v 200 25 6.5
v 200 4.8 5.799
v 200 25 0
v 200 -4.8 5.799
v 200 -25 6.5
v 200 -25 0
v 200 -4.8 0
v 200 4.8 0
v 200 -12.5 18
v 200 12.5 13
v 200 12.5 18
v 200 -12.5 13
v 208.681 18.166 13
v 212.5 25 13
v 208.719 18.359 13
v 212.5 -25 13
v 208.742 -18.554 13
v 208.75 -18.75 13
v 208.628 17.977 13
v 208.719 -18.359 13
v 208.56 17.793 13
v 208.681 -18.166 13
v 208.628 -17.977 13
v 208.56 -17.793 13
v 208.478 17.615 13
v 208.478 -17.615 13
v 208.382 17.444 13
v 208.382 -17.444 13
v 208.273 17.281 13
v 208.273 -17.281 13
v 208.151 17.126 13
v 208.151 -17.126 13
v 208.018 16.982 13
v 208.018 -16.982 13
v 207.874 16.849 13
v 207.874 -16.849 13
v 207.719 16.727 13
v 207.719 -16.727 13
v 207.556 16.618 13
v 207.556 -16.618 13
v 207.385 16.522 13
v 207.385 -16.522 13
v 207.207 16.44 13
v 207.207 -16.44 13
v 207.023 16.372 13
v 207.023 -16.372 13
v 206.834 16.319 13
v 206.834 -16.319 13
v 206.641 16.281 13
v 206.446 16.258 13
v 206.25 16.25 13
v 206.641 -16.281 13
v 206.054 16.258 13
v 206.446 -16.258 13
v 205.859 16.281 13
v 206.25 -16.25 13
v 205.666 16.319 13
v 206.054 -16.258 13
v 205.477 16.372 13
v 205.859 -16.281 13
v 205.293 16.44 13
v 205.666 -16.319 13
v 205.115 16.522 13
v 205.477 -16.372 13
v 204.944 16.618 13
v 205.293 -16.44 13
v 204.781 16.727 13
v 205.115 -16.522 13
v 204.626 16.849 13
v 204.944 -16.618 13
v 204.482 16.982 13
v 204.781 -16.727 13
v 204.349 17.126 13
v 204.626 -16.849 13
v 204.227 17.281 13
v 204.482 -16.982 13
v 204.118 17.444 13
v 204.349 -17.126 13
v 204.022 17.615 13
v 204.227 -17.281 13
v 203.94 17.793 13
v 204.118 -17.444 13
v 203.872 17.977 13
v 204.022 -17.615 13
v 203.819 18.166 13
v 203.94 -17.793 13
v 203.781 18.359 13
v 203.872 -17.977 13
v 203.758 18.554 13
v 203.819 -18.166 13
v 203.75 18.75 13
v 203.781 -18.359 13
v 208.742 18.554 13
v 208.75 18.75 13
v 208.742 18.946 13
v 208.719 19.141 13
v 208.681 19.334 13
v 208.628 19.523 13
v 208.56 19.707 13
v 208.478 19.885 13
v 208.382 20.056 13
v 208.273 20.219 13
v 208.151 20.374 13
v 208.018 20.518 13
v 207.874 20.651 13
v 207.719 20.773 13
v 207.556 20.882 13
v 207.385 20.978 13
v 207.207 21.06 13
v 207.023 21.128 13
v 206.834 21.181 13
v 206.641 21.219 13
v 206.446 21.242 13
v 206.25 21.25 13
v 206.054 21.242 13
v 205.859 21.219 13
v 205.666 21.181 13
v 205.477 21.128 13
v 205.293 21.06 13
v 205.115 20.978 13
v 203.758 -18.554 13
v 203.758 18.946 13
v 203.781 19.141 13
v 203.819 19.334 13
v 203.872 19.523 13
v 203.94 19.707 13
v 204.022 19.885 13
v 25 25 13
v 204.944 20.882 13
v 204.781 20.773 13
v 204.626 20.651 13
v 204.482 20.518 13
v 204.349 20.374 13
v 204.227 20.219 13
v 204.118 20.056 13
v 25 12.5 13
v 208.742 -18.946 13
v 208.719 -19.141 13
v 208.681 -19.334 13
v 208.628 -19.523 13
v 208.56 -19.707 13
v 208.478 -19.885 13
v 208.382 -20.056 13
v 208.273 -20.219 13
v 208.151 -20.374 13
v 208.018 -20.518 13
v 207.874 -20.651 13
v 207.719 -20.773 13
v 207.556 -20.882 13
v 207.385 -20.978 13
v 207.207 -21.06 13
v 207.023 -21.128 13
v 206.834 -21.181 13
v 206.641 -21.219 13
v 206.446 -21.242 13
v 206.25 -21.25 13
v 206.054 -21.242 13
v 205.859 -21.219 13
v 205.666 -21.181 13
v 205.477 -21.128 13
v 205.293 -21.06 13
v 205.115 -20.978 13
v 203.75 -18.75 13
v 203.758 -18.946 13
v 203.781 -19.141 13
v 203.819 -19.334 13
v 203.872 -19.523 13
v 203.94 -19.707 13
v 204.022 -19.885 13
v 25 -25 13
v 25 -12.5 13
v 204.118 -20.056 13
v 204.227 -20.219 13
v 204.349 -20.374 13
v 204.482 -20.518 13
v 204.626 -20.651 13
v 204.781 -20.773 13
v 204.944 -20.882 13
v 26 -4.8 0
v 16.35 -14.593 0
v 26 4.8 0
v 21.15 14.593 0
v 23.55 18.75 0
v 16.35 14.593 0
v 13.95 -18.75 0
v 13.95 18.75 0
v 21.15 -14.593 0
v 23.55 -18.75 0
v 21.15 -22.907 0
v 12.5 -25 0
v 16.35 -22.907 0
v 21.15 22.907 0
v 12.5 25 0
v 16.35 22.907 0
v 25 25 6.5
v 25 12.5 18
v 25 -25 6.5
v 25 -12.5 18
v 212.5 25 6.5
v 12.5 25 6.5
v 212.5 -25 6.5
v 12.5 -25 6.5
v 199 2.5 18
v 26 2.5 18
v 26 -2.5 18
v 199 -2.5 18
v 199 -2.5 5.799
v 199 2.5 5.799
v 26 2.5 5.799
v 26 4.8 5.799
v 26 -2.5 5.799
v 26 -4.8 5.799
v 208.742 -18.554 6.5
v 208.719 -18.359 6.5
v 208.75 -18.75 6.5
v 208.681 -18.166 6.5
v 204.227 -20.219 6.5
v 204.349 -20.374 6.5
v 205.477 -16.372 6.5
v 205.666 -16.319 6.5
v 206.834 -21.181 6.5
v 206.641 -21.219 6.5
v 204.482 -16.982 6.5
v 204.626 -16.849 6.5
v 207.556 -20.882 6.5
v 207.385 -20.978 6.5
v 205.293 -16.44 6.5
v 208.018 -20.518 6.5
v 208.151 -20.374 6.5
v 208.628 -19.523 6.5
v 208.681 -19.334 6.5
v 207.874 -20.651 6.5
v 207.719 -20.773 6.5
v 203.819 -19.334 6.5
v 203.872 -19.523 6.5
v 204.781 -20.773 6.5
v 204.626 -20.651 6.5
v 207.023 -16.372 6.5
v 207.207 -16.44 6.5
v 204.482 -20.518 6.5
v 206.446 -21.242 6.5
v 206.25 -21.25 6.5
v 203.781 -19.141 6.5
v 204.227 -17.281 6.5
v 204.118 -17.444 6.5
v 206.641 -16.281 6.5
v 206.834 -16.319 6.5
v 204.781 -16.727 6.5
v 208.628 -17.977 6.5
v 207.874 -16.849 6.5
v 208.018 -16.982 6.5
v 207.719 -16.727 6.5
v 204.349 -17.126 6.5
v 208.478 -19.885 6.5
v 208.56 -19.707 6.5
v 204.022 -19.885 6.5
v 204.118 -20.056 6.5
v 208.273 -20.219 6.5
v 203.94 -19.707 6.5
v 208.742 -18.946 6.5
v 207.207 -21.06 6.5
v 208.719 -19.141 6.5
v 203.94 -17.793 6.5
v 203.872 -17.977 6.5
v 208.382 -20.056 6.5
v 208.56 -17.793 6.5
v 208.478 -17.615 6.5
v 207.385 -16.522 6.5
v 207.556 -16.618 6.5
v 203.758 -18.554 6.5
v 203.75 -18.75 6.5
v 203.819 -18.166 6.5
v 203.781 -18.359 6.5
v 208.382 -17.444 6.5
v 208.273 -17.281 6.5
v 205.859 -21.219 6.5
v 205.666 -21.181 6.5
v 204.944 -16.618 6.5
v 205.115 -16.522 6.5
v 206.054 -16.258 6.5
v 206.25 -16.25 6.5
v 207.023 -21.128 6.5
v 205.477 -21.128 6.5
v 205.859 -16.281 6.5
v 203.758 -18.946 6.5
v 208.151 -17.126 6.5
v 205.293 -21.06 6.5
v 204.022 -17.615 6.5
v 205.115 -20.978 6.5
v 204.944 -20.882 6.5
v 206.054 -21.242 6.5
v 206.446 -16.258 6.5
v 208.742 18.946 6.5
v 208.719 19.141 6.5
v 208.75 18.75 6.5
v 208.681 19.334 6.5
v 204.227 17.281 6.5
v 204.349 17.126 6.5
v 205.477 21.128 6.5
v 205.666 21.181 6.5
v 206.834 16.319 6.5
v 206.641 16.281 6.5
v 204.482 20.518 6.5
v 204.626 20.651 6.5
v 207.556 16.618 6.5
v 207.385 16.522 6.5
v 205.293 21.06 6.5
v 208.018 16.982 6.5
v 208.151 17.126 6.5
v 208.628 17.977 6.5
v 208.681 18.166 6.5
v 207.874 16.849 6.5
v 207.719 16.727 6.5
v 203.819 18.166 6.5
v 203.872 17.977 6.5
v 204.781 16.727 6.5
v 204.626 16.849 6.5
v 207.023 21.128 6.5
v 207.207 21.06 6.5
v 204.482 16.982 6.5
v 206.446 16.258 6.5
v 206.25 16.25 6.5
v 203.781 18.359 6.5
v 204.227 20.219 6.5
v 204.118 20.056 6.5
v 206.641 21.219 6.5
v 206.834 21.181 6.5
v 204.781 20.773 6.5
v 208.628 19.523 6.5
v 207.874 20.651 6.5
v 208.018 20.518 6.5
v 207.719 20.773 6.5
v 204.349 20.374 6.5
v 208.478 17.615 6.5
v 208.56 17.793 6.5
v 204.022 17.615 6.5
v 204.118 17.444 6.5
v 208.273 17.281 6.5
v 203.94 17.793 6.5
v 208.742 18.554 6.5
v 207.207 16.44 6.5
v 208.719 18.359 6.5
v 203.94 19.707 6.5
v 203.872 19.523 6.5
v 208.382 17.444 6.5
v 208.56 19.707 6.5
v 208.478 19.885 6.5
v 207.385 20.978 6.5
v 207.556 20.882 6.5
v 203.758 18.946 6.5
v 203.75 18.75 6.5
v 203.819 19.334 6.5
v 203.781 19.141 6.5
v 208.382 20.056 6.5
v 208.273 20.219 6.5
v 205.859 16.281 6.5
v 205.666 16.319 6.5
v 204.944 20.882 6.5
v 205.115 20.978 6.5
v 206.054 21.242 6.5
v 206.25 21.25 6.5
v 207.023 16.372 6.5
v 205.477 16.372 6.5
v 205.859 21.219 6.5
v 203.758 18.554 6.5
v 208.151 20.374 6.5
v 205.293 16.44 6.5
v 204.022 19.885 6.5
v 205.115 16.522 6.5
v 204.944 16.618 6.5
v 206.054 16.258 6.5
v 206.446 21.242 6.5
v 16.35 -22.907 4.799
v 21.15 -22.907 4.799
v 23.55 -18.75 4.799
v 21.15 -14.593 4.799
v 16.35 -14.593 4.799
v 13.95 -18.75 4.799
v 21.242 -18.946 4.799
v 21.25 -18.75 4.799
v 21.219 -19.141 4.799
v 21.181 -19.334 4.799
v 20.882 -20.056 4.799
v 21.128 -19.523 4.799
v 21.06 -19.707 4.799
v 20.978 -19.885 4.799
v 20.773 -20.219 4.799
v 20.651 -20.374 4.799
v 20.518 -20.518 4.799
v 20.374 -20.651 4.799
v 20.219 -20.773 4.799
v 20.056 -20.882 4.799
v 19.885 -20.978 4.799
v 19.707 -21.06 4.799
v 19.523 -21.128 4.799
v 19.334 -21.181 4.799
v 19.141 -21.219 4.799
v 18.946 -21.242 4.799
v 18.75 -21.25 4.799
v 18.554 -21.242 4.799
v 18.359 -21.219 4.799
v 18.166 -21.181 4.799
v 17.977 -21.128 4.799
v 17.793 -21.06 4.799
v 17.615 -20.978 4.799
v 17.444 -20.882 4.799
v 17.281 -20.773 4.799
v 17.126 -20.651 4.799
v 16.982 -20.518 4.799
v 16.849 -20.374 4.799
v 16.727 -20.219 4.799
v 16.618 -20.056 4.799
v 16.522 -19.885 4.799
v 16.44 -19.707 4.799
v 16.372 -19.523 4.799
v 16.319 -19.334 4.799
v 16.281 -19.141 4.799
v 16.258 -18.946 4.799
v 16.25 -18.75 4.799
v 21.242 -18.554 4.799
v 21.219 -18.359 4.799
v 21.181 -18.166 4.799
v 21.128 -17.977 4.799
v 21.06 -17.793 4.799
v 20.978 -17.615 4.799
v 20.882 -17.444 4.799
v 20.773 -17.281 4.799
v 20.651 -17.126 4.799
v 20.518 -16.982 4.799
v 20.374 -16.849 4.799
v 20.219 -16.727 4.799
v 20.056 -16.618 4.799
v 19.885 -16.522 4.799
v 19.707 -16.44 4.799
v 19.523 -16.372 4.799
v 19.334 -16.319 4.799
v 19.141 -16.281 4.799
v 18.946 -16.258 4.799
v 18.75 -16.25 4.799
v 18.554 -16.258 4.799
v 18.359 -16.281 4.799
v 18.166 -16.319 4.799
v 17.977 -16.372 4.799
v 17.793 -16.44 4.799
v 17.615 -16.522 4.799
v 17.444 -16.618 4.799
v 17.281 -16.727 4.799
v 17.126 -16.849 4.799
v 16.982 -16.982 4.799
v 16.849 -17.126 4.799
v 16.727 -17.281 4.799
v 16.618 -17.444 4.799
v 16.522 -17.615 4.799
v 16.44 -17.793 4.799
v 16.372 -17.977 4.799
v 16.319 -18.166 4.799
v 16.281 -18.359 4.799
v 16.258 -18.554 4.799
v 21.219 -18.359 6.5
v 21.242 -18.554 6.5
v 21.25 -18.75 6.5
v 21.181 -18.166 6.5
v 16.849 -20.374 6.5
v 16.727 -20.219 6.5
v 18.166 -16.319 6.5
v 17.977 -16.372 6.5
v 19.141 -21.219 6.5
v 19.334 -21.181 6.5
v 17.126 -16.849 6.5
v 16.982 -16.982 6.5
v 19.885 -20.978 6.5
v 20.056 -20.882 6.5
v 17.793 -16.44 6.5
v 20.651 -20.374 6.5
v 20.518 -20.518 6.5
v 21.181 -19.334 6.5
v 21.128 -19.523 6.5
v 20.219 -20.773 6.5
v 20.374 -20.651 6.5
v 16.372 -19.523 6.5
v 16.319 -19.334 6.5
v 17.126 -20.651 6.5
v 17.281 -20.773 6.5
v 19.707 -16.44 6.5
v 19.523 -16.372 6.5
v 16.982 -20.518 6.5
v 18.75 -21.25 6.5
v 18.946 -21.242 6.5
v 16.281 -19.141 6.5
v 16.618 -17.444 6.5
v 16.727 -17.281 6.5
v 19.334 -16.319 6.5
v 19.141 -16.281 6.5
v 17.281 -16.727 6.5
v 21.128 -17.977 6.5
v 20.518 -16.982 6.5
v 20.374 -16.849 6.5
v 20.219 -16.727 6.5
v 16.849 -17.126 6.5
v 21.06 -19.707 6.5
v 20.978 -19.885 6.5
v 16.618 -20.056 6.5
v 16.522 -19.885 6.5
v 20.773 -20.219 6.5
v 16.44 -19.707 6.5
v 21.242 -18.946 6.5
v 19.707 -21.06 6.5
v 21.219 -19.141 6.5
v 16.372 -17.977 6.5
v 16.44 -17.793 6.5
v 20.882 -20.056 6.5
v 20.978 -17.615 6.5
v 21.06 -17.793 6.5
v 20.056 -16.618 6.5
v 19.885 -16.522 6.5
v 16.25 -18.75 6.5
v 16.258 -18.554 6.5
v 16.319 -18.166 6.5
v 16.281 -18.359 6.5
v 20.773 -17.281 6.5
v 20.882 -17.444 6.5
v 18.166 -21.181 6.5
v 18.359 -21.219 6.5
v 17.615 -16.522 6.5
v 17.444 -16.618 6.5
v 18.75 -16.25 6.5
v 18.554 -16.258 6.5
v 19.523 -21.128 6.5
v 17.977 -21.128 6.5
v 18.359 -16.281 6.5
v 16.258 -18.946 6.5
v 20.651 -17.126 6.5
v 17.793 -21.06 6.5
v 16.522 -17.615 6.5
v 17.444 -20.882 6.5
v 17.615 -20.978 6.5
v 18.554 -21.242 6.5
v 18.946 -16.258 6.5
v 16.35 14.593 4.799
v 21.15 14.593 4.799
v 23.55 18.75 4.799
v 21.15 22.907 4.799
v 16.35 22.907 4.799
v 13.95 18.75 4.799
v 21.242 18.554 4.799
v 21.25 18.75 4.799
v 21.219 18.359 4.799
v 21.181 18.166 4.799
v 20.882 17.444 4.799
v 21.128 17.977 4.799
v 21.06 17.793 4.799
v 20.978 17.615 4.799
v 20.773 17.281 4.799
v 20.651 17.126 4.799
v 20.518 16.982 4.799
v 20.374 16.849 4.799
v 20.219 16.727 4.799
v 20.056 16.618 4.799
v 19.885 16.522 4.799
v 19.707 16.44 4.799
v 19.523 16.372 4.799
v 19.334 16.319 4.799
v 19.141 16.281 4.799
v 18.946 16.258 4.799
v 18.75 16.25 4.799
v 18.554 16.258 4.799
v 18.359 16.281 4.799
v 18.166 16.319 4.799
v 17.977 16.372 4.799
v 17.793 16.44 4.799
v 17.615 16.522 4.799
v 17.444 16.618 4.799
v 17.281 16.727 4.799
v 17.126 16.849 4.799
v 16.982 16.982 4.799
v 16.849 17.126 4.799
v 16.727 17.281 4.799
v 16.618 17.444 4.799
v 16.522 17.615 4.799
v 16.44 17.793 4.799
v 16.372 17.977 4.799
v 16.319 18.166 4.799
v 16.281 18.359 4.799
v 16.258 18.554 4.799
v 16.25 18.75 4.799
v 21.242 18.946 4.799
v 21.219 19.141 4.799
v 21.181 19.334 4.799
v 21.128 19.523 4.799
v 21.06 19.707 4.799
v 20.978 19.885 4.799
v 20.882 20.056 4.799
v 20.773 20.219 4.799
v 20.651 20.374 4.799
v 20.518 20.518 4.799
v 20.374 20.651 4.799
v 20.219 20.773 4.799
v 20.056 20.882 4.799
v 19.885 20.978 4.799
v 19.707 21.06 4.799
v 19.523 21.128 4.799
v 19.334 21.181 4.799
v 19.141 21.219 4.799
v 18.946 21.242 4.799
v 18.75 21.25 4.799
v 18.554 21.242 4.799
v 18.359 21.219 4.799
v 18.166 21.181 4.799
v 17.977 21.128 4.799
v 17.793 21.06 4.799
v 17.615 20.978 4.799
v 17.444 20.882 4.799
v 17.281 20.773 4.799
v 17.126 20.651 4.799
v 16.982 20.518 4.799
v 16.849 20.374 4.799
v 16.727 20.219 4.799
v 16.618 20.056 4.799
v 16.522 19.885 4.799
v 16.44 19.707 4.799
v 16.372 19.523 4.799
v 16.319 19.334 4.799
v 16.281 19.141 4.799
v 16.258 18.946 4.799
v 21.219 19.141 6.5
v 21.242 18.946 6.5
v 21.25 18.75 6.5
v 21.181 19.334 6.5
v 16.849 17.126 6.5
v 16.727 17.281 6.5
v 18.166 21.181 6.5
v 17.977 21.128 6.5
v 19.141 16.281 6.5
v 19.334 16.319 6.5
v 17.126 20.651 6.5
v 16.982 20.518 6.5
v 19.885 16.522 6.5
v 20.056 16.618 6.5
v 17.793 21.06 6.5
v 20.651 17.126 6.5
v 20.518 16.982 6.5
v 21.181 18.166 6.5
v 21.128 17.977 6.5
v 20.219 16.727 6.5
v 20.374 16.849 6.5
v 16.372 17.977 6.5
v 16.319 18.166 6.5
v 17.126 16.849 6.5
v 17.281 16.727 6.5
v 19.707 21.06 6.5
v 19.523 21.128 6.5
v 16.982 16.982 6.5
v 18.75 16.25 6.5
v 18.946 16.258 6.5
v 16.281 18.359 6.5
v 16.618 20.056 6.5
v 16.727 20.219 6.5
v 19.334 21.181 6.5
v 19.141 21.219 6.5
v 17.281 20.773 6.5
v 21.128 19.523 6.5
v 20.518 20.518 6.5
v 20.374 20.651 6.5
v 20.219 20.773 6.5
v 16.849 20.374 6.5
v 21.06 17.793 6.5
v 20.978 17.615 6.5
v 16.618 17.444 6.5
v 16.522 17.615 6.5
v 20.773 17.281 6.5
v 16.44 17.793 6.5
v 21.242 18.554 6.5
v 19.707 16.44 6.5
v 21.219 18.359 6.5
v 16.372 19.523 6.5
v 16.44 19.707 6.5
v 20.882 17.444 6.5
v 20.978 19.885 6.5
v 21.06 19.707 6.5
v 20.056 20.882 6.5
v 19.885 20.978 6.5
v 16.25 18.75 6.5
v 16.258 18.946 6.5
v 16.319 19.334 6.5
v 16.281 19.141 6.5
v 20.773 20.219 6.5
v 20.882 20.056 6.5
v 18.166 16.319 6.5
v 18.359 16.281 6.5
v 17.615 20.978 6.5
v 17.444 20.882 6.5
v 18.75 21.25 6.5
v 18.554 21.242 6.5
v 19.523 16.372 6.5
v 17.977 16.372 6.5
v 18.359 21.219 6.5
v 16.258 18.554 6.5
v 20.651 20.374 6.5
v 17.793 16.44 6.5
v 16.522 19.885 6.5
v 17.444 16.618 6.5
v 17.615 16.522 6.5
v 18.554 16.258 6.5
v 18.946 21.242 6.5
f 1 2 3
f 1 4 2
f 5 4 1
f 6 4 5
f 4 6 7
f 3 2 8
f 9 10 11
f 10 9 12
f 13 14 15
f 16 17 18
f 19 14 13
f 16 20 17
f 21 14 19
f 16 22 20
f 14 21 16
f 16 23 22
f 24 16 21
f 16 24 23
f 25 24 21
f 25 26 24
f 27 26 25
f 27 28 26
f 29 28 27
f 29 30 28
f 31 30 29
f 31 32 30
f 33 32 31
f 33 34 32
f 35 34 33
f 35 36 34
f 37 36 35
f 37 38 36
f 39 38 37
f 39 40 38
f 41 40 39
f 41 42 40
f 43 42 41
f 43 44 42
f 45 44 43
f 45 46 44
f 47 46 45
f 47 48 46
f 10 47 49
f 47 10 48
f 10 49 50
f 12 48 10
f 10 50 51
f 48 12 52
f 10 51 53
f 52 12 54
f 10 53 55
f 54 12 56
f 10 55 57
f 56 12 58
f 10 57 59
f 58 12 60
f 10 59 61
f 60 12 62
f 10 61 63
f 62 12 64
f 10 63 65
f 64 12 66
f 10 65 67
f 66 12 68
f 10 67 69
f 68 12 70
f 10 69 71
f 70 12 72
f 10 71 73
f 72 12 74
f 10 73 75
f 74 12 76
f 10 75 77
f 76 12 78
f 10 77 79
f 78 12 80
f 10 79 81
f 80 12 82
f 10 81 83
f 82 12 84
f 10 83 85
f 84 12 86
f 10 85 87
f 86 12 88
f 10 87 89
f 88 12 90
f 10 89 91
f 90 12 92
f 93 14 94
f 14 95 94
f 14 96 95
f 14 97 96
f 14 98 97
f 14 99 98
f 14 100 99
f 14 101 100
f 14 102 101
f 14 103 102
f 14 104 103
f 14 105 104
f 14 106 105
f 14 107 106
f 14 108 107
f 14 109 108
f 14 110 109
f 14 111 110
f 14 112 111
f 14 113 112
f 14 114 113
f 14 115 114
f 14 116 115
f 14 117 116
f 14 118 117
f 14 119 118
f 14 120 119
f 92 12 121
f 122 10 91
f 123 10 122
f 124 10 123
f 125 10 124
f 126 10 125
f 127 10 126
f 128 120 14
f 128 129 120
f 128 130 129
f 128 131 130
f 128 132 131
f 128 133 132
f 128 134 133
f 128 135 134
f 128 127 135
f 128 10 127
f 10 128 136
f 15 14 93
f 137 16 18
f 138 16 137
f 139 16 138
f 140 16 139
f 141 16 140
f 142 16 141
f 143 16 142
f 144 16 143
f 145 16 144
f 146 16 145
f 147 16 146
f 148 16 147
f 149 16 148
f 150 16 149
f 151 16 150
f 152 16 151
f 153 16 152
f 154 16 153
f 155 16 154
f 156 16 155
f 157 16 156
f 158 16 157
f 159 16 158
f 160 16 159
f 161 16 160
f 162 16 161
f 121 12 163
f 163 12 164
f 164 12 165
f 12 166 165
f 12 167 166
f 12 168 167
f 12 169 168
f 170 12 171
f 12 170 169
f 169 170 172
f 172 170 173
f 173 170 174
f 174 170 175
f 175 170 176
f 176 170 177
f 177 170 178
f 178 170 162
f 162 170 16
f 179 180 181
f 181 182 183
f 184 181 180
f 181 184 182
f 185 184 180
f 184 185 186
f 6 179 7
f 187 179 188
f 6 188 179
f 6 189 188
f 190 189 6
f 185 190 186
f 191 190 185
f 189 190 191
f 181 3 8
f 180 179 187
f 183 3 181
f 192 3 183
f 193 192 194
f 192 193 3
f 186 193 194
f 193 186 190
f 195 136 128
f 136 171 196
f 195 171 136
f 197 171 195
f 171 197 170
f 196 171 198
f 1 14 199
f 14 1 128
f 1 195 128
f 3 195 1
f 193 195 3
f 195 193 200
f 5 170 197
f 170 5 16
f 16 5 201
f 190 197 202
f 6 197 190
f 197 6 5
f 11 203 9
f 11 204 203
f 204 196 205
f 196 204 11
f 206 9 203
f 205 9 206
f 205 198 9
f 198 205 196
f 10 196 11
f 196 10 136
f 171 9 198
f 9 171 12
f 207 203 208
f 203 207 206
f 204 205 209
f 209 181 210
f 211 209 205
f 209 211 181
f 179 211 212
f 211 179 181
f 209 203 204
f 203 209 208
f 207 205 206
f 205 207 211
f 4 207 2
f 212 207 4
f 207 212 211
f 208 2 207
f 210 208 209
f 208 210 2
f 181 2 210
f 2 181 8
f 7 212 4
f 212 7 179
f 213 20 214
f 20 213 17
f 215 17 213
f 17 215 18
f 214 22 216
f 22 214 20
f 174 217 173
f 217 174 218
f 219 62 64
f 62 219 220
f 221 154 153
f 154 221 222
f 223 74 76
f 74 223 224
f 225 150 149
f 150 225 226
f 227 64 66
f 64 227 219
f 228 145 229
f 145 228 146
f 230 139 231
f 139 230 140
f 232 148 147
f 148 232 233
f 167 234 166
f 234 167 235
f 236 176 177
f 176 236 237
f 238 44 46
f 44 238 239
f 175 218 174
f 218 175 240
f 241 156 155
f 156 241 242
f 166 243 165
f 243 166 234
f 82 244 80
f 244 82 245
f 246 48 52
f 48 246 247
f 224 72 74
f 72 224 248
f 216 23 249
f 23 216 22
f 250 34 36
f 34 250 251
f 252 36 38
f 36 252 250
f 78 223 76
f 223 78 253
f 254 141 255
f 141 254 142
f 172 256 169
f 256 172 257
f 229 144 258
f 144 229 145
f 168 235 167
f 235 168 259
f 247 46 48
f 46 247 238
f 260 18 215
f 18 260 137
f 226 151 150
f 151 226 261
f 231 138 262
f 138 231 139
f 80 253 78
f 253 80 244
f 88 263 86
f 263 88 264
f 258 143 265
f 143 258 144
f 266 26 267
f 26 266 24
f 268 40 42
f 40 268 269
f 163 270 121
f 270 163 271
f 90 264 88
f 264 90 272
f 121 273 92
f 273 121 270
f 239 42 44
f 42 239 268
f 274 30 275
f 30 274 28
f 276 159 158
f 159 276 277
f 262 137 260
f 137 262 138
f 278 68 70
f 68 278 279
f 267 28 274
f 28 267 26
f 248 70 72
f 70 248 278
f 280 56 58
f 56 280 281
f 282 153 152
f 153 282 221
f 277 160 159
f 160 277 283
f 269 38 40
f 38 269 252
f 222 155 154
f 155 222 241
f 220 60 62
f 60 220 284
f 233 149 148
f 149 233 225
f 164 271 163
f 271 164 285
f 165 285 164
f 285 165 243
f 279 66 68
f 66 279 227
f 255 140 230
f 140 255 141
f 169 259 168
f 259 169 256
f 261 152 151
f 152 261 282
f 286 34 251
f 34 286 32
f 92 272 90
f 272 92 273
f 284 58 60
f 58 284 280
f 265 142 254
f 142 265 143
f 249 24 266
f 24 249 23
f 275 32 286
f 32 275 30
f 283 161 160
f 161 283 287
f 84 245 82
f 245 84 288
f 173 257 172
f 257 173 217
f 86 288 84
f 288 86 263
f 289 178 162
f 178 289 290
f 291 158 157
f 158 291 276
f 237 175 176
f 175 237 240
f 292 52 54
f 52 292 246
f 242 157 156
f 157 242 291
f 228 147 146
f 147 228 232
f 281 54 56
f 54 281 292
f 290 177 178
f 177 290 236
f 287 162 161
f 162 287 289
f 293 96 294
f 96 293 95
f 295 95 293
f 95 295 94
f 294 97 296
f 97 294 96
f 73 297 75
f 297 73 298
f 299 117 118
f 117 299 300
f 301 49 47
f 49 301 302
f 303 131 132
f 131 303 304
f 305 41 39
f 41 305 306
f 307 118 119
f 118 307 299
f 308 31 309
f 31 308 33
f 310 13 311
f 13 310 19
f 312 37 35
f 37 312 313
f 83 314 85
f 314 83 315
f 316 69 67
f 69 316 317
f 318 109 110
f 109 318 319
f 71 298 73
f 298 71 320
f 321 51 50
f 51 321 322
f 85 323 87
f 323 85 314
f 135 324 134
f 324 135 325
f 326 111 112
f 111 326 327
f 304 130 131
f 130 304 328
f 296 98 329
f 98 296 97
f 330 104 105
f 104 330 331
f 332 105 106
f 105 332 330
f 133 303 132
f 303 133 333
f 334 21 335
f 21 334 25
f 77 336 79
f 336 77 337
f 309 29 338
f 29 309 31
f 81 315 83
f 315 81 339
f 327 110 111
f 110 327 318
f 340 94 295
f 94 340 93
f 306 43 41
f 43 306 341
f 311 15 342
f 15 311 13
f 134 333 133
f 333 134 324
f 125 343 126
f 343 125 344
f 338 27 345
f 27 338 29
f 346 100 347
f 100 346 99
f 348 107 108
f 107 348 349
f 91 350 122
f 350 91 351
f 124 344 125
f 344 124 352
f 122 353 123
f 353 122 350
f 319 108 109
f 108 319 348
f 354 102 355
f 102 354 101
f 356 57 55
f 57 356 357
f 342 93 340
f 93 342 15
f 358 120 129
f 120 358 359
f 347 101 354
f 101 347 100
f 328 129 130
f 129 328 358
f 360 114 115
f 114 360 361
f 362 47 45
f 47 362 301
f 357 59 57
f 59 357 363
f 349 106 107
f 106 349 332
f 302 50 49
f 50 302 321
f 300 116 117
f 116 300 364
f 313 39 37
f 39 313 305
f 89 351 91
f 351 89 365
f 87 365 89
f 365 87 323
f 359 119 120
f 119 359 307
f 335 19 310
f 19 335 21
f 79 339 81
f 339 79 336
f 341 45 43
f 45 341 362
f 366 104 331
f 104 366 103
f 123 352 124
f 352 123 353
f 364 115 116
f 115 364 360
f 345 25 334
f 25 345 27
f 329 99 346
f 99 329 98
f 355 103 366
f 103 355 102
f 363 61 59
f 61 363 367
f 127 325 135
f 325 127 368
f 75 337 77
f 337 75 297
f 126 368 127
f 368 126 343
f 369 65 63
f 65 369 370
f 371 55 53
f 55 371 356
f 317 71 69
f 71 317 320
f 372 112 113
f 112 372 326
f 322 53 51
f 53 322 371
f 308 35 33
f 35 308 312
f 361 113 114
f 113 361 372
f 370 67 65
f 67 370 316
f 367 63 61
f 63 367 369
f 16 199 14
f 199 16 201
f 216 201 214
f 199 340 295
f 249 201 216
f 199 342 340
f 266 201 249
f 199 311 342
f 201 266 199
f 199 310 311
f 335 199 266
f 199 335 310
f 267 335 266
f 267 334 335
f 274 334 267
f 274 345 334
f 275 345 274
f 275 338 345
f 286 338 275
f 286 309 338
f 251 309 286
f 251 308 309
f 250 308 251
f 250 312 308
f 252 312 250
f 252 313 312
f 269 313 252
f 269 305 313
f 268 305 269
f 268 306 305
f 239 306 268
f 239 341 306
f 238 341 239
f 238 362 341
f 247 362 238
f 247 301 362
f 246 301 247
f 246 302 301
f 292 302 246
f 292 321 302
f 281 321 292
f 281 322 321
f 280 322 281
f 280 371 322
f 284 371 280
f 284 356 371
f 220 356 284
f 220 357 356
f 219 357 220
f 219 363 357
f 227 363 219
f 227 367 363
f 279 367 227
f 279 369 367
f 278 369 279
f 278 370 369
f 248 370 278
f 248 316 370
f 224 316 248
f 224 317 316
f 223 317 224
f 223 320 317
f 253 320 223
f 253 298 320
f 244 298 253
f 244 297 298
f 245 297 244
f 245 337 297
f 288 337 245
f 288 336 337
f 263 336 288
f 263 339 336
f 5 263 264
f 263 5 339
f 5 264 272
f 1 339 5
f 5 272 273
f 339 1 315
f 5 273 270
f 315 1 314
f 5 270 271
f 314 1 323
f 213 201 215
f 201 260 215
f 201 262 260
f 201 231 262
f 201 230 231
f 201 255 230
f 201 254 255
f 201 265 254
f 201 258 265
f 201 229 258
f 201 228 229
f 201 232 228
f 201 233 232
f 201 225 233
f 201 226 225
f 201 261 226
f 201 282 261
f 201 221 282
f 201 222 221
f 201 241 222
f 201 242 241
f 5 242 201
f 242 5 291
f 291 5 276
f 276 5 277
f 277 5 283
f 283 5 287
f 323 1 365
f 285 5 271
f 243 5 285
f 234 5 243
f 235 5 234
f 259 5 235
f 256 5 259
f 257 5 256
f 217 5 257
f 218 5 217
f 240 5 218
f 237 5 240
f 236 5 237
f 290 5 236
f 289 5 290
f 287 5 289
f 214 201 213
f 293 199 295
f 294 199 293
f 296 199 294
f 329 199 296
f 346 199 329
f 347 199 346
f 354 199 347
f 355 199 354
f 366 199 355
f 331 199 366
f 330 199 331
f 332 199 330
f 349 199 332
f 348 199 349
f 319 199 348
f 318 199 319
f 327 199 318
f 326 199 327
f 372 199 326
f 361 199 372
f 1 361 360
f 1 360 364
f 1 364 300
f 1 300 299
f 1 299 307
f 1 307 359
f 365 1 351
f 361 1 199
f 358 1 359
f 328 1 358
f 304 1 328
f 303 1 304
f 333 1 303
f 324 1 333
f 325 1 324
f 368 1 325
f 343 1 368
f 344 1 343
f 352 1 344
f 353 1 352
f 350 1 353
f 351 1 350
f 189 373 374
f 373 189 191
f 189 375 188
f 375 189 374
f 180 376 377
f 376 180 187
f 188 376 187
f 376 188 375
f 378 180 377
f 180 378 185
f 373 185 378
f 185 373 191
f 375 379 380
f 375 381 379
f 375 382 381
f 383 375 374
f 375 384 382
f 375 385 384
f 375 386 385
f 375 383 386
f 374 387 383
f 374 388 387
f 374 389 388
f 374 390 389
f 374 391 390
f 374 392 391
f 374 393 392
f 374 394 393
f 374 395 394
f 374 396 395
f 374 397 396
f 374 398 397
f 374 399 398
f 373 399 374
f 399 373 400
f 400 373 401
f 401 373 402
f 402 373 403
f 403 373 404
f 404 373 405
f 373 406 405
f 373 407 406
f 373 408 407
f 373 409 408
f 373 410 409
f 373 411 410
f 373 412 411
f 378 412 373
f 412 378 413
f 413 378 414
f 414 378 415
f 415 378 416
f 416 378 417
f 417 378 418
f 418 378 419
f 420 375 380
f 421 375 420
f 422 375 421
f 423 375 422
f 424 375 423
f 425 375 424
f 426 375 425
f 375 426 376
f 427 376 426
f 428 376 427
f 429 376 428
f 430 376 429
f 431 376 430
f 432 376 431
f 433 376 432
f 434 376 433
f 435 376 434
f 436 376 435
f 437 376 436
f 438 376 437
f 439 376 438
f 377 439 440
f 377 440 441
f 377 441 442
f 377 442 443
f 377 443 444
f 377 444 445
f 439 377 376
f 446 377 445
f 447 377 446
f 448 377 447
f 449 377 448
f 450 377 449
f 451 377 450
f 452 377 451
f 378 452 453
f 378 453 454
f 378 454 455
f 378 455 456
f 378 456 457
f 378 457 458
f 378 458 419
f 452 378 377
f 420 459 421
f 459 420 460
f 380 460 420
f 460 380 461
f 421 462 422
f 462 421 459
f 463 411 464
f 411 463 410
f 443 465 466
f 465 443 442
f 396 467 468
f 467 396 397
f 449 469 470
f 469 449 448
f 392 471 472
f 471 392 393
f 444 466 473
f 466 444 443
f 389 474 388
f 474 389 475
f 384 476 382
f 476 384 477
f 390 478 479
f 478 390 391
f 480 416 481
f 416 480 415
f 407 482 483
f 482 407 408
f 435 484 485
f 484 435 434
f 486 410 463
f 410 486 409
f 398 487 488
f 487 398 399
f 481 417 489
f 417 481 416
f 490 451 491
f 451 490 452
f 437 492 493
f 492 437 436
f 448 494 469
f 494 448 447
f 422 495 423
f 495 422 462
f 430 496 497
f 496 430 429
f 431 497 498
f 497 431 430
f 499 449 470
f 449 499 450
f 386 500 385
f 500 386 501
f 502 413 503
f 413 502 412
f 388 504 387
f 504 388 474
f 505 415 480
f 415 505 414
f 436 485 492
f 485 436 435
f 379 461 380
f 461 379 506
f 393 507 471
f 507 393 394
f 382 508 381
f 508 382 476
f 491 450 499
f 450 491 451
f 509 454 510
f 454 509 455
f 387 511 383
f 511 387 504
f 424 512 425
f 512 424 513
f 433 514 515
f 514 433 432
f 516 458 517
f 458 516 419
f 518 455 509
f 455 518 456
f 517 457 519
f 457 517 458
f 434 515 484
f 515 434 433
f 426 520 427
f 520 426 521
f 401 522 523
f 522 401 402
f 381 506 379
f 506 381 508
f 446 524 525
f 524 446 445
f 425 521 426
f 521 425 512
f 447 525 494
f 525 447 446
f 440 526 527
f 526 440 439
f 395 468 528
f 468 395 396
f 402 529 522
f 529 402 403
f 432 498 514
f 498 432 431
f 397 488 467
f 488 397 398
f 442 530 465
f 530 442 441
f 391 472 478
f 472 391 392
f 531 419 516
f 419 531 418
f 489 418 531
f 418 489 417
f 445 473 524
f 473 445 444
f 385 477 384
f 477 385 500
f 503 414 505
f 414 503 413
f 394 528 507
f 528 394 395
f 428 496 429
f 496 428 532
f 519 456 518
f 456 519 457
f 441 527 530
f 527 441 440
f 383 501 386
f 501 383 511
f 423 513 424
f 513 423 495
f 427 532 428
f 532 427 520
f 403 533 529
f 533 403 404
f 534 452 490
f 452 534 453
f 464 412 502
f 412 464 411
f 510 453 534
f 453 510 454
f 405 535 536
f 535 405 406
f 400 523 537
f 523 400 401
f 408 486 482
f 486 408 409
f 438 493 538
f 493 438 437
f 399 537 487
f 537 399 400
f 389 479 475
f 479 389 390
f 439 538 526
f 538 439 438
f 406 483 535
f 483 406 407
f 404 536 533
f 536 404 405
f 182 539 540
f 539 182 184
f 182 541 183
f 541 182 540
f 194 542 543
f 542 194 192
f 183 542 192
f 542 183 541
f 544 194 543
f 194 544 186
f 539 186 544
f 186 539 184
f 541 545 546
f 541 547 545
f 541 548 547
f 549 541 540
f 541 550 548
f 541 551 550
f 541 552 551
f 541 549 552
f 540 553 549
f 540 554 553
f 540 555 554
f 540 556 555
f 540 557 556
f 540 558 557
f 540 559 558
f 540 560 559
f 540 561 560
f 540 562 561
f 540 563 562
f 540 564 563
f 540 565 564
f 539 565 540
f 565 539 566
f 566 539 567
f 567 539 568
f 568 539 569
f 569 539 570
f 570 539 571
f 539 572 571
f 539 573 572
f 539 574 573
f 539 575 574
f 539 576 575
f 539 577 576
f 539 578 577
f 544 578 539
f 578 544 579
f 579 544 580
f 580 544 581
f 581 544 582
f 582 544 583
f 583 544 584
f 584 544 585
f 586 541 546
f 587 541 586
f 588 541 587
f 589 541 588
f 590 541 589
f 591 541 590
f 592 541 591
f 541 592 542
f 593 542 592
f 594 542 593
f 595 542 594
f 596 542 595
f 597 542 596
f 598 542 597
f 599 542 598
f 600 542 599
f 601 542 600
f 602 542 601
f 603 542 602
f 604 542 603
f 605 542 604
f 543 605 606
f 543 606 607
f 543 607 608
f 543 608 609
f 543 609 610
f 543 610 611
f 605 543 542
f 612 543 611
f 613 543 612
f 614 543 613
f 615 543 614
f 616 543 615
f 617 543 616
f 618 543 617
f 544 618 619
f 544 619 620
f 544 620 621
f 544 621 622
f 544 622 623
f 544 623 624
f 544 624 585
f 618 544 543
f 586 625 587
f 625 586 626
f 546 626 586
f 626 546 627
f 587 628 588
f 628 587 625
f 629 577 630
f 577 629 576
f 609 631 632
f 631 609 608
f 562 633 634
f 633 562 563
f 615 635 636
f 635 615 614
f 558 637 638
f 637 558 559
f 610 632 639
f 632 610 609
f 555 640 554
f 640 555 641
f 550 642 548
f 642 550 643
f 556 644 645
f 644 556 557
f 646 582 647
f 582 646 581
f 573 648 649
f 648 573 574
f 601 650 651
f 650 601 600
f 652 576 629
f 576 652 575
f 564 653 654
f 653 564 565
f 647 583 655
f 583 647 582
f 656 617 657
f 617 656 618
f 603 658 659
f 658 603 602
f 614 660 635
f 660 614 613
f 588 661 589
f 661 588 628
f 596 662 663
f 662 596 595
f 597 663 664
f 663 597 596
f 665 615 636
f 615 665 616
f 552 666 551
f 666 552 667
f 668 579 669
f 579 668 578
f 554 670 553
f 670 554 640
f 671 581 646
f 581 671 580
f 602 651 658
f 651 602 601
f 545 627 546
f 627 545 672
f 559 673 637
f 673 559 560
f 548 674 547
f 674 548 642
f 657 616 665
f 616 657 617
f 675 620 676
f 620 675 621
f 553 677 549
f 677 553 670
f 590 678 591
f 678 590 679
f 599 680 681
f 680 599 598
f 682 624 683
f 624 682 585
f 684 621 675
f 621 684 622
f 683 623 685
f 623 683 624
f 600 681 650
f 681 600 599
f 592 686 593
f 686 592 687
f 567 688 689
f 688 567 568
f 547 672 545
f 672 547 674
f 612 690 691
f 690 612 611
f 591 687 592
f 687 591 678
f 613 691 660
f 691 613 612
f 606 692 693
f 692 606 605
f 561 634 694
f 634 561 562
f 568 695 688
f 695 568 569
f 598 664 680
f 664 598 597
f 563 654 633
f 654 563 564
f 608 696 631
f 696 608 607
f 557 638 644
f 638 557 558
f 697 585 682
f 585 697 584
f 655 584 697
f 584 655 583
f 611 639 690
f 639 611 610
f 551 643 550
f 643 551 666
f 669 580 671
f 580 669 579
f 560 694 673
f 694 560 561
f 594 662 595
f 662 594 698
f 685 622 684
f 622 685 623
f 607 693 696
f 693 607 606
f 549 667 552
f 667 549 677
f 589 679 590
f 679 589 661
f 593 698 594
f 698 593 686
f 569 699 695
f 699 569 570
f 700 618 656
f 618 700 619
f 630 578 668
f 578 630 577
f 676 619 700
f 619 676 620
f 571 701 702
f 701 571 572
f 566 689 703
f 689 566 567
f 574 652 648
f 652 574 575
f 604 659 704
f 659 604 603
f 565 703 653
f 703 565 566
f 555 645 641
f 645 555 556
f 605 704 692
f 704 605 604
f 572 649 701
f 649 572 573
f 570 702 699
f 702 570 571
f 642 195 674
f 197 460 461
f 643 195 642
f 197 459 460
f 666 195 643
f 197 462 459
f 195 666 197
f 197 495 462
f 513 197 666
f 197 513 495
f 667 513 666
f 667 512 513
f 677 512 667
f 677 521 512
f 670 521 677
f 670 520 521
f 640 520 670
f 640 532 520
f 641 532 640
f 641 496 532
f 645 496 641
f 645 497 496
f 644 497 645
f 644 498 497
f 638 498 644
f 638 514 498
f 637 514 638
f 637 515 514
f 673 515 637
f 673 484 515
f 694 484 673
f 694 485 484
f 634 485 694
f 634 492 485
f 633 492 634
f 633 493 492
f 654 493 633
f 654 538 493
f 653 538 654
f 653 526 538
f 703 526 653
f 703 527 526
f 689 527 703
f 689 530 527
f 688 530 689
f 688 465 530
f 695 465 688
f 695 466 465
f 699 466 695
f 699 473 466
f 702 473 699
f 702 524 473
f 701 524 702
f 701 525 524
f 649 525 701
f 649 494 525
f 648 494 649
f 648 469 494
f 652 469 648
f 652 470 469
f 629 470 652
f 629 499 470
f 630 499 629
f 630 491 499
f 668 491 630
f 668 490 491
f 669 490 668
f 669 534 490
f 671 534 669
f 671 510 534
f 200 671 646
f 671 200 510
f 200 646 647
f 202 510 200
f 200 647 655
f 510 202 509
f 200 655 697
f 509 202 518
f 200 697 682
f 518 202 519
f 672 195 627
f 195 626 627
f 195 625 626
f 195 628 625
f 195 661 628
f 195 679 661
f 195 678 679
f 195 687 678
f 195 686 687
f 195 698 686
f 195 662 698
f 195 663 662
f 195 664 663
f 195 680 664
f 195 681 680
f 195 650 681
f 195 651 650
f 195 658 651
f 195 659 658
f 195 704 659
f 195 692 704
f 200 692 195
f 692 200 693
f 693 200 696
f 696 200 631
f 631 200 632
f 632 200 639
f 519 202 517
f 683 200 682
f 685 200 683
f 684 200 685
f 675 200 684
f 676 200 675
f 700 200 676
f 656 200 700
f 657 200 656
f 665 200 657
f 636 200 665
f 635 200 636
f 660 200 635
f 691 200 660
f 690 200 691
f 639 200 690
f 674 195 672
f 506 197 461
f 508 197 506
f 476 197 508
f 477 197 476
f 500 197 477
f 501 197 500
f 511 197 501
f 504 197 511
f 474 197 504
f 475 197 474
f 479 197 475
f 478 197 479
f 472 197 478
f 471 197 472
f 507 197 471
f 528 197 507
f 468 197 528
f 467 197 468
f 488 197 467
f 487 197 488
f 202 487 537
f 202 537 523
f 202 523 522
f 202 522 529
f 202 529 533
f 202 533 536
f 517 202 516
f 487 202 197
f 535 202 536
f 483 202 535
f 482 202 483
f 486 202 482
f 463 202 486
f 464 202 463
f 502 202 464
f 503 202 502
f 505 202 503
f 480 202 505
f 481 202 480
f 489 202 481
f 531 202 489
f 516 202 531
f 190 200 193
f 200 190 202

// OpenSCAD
// file: Modules.scad
/*
 * Jig to hold a model airplane while working on it.
 *
 * Vertical sections slide horizonally. Horizontal dimensions are scalable
 * by adding one or more extension bars.
 *
 * Wing supports clamp magnetically. Be sure to glue some felt on the
 * insides of the wing supports to protect the model
 *
 * ©Louis Kowolowski 2020
 */

module tail_holder () {
	translate ([3*bar_w, 0, 10]) {
		rotate ([0, 180, 0]) {
			tail_holder_bottom ();
		}
	}
	// height is +5 (thickness of top) because its been flipped over
	translate ([0, 0, -7]) {
		tail_holder_top ();
	}
}

module tail_holder_bottom () {
	difference () {
		cube ([3*bar_w, 1.5*bar_screw_head_d, bar_w/4]);

		union () {
			// screw/nut hole
			translate ([1.5*bar_w, 1.5*bar_screw_head_d+0.001, bar_w/8]) {
				rotate ([90, 0, 0]) {
					bar_screw ();
				}
			}
			// left magnet hole
			translate ([0.75*bar_screw_head_d, 1.5*bar_screw_d, bar_w/4-magnet_h+0.001]) {
				cylinder (magnet_h, d=magnet_d, $fn=80);
			}
			// right magnet hole
			translate ([(3*bar_w)-(0.75*bar_screw_head_d), 1.5*bar_screw_d, bar_w/4-magnet_h+0.001]) {
				cylinder (magnet_h, d=magnet_d, $fn=80);
			}
		}
	}
	// left side
	translate ([0, 1.5*bar_screw_head_d, 0]) {
		cube ([bar_w, bar_w, 5]);
	}

	// right side
	translate ([2*bar_w, 1.5*bar_screw_head_d, 0]) {
		cube ([bar_w, bar_w, 5]);
	}

}

module tail_holder_top () {

	difference () {
		cube ([3*bar_w, 1.5*bar_screw_head_d, 5]);
		union () {
			// left magnet hole
			translate ([0.75*bar_screw_head_d, 1.5*bar_screw_d, 5.001-magnet_h]) {
				cylinder (magnet_h, d=magnet_d, $fn=80);
			}
			// right magnet hole
			translate ([(3*bar_w)-(0.75*bar_screw_head_d), 1.5*bar_screw_d, 5.001-magnet_h]) {
				cylinder (magnet_h, d=magnet_d, $fn=80);
			}
		}
	}
	// left side
	translate ([0, 1.5*bar_screw_head_d, 0]) {
		cube ([bar_w, bar_w, 5]);
	}

	// right side
	translate ([2*bar_w, 1.5*bar_screw_head_d, 0]) {
		cube ([bar_w, bar_w, 5]);
	}
}

module nose_holder () {
	difference () {
		union () {
			cube ([bar_w, bar_w, 6]);
			translate ([0, 0, 6]) {
				// rear block to house screw/nut holder and magnets for top
				cube ([bar_screw_head_d, bar_w, 1.5*bar_screw_head_d]);
			}
			translate ([0, 0, 6]) {
				// rear block to house screw/nut holder and magnets for top
				cube ([bar_w, bar_w, 1.5*bar_screw_head_d]);
			}
		}
		union () {
			// screw/nut hole
			translate ([bar_screw_head_d+1, bar_w/2, 10]) {
				rotate ([0, 270, 0]) {
					bar_screw ();
				}
			}
			// angled cut to hold nose centered in jib
			translate ([bar_w/2+.5*bar_screw_head_d+0.001, bar_w/2, bar_w/2-5]) {
				rotate ([270, 210, 90]) {
					Triangle(a=bar_w, b=bar_w, angle=120, height=bar_w-bar_screw_head_d+0.001, centerXYZ=[true,true,true]);
				}
			}
			
		}
	}
}


module wing_holder () {
	wing_holder_bottom ();

	translate ([0, 0, 1.5*bar_screw_head_d+2]) {
		wing_holder_top ();
	}
}

module wing_holder_bottom () {
	// slides up and down the riser to hold the wing at the correct height
	difference () {
		union () {
			cube ([bar_w, bar_w, 6]);
			translate ([0, 0, 6]) {
				// rear block to house screw/nut holder and magnets for top
				// add 1 to height for room above the nut
				cube ([bar_screw_head_d, bar_w, bar_screw_head_d+1]);
			}
		}
		union () {
			// screw/nut hole
			translate ([bar_screw_head_d+1, bar_w/2, 11]) {
				rotate ([0, 270, 0]) {
					bar_screw ();
				}
			}
			// magnet mounting holes
			translate ([magnet_d/2+2, magnet_d, bar_screw_head_d+4.001]) {
				rotate ([0, 0, 90]) {
					cylinder (magnet_h, d=magnet_d, $fn=80);
				}
			}
			// magnet mounting holes
			translate ([magnet_d/2+2, bar_w-magnet_d, bar_screw_head_d+4.001]) {
				rotate ([0, 0, 90]) {
					cylinder (magnet_h, d=magnet_d, $fn=80);
				}
			}
		}
	}
}

module wing_holder_top () {
	difference () {
		cube ([bar_w, bar_w, 6]);
		union () {
			// magnet mounting holes
			translate ([bar_w-magnet_d, magnet_d, -1*0.001]) {
				rotate ([0, 0, 90]) {
					cylinder (magnet_h, d=magnet_d, $fn=80);
				}
			}
			// magnet mounting holes
			translate ([bar_w-magnet_d, bar_w-magnet_d, -1*0.001]) {
				rotate ([0, 0, 90]) {
					cylinder (magnet_h, d=magnet_d, $fn=80);
				}
			}
		}
	}
}

module riser () {
	/* vertical bar that will slide forward/backward on the base and hold the
	 * horizontal rest(s) for the model
	 */
	difference () {
		// base
		cube ([riser_w, riser_w, riser_w/4]);	
		union () {
			// slot at bottom for guide on bar
			translate ([riser_w/4, -1*0.001, -1*0.01]) {
				cube ([riser_w/2, riser_w+1, 5.01]);
			}
			// cross slot at bottom for guide on bar
			translate ([-0.001, riser_w/4, -1*0.01]) {
				cube ([riser_w+1, riser_w/2, 5.01]);
			}
			// screw hole
			translate ([riser_w/2, riser_w/2, -1*bar_screw_head_h]) {
				bar_screw ();
			}
		}
	}
	difference () {
		// vartical riser
		translate ([0, 0, riser_w/4]) {
			cube ([riser_w, riser_w/8, riser_l]);
		}
		// screw slot
		translate ([riser_w/2-bar_screw_d/2, -1, riser_w]) {
			cube ([bar_screw_d, riser_w/4+1, riser_l-riser_w]);
		}
	}
}

module bar_screw () {
	// Model of a screw and hex head/nut

	// screw head
	cylinder(bar_screw_head_h, d=bar_screw_head_d, $fn=6);
	translate ([0, 0, 0]) {
		// screw body
		cylinder(bar_screw_h, d=bar_screw_d, $fn=80);
	}
}

module bar () {
	/* lower base unit. Comes together as a cross. Each bar can be extended with
	 * additional bars.
	 * Raised section acts as a guide for the riser. Slot down the middle is for
	 * a clamping butterfly screw.
	 */
	difference () {
		union () {
			cube ([bar_l, bar_w, bar_h]);
			translate ([0, bar_w/4, 0]) {
				// guide slot
				cube ([bar_l, bar_w/2, bar_h+5]);
			}
		}
		translate ([1, bar_w/2-bar_screw_d/2, -0.001]) {
			cube ([bar_l-2, bar_screw_d, bar_screw_h]);
		}
		translate ([1, bar_w/2-bar_screw_head_d/2, -0.001]) {
			 cube ([bar_l, bar_screw_head_d, bar_screw_head_h+1]);
		}
	}
	// upper extension
	difference () {
		translate ([bar_l, 0, bar_h/2]) {
			cube ([bar_w/4, bar_w, bar_h/2]);
		}
		union () {
			// 2 screw holes
			// left
			translate ([bar_l+bar_w/8, bar_w/8, -1*0.001]) {
				bar_screw ();
			}
			// right
			translate ([bar_l+bar_w/8, bar_w-bar_w/8, -1*0.001]) {
				bar_screw ();
			}
		}
	}
	// lower extension
	difference () {
		translate ([-1*bar_w/4, 0, 0]) {
			cube ([bar_w/4, bar_w, bar_h/2]);
		}
		union () {
			// 2 screw holes
			// left
			translate ([-1*bar_w/4+bar_w/8, bar_w/8, -1*0.001]) {
				bar_screw ();
			}
			// right
			translate ([-1*bar_w/4+bar_w/8, bar_w-bar_w/8, -1*0.001]) {
				bar_screw ();
			}
		}
	}

}

module Triangle(
			a, b, angle, height=1, heights=undef,
			center=undef, centerXYZ=[false,false,false]) {
	// Calculate Heights at each point
	heightAB = ((heights==undef) ? height : heights[0])/2;
	heightBC = ((heights==undef) ? height : heights[1])/2;
	heightCA = ((heights==undef) ? height : heights[2])/2;
	centerZ = (center || (center==undef && centerXYZ[2]))?0:max(heightAB,heightBC,heightCA);

	// Calculate Offsets for centering
	offsetX = (center || (center==undef && centerXYZ[0]))?((cos(angle)*a)+b)/3:0;
	offsetY = (center || (center==undef && centerXYZ[1]))?(sin(angle)*a)/3:0;
	
	pointAB1 = [-offsetX,-offsetY, centerZ-heightAB];
	pointAB2 = [-offsetX,-offsetY, centerZ+heightAB];
	pointBC1 = [b-offsetX,-offsetY, centerZ-heightBC];
	pointBC2 = [b-offsetX,-offsetY, centerZ+heightBC];
	pointCA1 = [(cos(angle)*a)-offsetX,(sin(angle)*a)-offsetY, centerZ-heightCA];
	pointCA2 = [(cos(angle)*a)-offsetX,(sin(angle)*a)-offsetY, centerZ+heightCA];

	polyhedron(
		points=[	pointAB1, pointBC1, pointCA1,
					pointAB2, pointBC2, pointCA2 ],
		faces=[	
			[0, 1, 2],
			[3, 5, 4],
			[0, 3, 1],
			[1, 3, 4],
			[1, 4, 2],
			[2, 4, 5],
			[2, 5, 0],
			[0, 5, 3] ] );
}
// file: Globals.scad
/*
 * Global variables used for all the models
 * All units are in mm
 *
 * Jig to hold a model airplane while working on it.
 *
 * Vertical sections slide horizonally. Horizontal dimensions are scalable
 * by adding one or more extension bars.
 *
 * Wing supports clamp magnetically. Be sure to glue some felt on the
 * insides of the wing supports to protect the model
 *
 * ©Louis Kowolowski 2020
 */

/* long dimensions are constrained by the size of the print bed
 */
bar_l = 175;
bar_w = 50;
bar_h = 13;

riser_l = 150;
riser_w = 50;
riser_h = 12;

// M5x20
bar_screw_head_h = 4.8;
bar_screw_head_d = 9.6;
bar_screw_h = 20;
bar_screw_d = 5;

guide_rail_l = bar_l;
guide_rail_w = bar_w/2;
guide_rail_h = 2;

magnet_h = 3;
magnet_d = 5;
// main file
/*
 * Jig to hold a model airplane while working on it.
 *
 * Vertical sections slide horizonally. Horizontal dimensions are scalable
 * by adding one or more extension bars.
 *
 * Wing supports clamp magnetically. Be sure to glue some felt on the 
 * insides of the wing supports to protect the model
 *
 * ©Louis Kowolowski 2020
 */

/*
 * Include globals and modules
 */
include <Globals.scad>;
include <Modules.scad>;

translate ([bar_w/2, -1*bar_w/2, 0]) {
	bar ();
}
